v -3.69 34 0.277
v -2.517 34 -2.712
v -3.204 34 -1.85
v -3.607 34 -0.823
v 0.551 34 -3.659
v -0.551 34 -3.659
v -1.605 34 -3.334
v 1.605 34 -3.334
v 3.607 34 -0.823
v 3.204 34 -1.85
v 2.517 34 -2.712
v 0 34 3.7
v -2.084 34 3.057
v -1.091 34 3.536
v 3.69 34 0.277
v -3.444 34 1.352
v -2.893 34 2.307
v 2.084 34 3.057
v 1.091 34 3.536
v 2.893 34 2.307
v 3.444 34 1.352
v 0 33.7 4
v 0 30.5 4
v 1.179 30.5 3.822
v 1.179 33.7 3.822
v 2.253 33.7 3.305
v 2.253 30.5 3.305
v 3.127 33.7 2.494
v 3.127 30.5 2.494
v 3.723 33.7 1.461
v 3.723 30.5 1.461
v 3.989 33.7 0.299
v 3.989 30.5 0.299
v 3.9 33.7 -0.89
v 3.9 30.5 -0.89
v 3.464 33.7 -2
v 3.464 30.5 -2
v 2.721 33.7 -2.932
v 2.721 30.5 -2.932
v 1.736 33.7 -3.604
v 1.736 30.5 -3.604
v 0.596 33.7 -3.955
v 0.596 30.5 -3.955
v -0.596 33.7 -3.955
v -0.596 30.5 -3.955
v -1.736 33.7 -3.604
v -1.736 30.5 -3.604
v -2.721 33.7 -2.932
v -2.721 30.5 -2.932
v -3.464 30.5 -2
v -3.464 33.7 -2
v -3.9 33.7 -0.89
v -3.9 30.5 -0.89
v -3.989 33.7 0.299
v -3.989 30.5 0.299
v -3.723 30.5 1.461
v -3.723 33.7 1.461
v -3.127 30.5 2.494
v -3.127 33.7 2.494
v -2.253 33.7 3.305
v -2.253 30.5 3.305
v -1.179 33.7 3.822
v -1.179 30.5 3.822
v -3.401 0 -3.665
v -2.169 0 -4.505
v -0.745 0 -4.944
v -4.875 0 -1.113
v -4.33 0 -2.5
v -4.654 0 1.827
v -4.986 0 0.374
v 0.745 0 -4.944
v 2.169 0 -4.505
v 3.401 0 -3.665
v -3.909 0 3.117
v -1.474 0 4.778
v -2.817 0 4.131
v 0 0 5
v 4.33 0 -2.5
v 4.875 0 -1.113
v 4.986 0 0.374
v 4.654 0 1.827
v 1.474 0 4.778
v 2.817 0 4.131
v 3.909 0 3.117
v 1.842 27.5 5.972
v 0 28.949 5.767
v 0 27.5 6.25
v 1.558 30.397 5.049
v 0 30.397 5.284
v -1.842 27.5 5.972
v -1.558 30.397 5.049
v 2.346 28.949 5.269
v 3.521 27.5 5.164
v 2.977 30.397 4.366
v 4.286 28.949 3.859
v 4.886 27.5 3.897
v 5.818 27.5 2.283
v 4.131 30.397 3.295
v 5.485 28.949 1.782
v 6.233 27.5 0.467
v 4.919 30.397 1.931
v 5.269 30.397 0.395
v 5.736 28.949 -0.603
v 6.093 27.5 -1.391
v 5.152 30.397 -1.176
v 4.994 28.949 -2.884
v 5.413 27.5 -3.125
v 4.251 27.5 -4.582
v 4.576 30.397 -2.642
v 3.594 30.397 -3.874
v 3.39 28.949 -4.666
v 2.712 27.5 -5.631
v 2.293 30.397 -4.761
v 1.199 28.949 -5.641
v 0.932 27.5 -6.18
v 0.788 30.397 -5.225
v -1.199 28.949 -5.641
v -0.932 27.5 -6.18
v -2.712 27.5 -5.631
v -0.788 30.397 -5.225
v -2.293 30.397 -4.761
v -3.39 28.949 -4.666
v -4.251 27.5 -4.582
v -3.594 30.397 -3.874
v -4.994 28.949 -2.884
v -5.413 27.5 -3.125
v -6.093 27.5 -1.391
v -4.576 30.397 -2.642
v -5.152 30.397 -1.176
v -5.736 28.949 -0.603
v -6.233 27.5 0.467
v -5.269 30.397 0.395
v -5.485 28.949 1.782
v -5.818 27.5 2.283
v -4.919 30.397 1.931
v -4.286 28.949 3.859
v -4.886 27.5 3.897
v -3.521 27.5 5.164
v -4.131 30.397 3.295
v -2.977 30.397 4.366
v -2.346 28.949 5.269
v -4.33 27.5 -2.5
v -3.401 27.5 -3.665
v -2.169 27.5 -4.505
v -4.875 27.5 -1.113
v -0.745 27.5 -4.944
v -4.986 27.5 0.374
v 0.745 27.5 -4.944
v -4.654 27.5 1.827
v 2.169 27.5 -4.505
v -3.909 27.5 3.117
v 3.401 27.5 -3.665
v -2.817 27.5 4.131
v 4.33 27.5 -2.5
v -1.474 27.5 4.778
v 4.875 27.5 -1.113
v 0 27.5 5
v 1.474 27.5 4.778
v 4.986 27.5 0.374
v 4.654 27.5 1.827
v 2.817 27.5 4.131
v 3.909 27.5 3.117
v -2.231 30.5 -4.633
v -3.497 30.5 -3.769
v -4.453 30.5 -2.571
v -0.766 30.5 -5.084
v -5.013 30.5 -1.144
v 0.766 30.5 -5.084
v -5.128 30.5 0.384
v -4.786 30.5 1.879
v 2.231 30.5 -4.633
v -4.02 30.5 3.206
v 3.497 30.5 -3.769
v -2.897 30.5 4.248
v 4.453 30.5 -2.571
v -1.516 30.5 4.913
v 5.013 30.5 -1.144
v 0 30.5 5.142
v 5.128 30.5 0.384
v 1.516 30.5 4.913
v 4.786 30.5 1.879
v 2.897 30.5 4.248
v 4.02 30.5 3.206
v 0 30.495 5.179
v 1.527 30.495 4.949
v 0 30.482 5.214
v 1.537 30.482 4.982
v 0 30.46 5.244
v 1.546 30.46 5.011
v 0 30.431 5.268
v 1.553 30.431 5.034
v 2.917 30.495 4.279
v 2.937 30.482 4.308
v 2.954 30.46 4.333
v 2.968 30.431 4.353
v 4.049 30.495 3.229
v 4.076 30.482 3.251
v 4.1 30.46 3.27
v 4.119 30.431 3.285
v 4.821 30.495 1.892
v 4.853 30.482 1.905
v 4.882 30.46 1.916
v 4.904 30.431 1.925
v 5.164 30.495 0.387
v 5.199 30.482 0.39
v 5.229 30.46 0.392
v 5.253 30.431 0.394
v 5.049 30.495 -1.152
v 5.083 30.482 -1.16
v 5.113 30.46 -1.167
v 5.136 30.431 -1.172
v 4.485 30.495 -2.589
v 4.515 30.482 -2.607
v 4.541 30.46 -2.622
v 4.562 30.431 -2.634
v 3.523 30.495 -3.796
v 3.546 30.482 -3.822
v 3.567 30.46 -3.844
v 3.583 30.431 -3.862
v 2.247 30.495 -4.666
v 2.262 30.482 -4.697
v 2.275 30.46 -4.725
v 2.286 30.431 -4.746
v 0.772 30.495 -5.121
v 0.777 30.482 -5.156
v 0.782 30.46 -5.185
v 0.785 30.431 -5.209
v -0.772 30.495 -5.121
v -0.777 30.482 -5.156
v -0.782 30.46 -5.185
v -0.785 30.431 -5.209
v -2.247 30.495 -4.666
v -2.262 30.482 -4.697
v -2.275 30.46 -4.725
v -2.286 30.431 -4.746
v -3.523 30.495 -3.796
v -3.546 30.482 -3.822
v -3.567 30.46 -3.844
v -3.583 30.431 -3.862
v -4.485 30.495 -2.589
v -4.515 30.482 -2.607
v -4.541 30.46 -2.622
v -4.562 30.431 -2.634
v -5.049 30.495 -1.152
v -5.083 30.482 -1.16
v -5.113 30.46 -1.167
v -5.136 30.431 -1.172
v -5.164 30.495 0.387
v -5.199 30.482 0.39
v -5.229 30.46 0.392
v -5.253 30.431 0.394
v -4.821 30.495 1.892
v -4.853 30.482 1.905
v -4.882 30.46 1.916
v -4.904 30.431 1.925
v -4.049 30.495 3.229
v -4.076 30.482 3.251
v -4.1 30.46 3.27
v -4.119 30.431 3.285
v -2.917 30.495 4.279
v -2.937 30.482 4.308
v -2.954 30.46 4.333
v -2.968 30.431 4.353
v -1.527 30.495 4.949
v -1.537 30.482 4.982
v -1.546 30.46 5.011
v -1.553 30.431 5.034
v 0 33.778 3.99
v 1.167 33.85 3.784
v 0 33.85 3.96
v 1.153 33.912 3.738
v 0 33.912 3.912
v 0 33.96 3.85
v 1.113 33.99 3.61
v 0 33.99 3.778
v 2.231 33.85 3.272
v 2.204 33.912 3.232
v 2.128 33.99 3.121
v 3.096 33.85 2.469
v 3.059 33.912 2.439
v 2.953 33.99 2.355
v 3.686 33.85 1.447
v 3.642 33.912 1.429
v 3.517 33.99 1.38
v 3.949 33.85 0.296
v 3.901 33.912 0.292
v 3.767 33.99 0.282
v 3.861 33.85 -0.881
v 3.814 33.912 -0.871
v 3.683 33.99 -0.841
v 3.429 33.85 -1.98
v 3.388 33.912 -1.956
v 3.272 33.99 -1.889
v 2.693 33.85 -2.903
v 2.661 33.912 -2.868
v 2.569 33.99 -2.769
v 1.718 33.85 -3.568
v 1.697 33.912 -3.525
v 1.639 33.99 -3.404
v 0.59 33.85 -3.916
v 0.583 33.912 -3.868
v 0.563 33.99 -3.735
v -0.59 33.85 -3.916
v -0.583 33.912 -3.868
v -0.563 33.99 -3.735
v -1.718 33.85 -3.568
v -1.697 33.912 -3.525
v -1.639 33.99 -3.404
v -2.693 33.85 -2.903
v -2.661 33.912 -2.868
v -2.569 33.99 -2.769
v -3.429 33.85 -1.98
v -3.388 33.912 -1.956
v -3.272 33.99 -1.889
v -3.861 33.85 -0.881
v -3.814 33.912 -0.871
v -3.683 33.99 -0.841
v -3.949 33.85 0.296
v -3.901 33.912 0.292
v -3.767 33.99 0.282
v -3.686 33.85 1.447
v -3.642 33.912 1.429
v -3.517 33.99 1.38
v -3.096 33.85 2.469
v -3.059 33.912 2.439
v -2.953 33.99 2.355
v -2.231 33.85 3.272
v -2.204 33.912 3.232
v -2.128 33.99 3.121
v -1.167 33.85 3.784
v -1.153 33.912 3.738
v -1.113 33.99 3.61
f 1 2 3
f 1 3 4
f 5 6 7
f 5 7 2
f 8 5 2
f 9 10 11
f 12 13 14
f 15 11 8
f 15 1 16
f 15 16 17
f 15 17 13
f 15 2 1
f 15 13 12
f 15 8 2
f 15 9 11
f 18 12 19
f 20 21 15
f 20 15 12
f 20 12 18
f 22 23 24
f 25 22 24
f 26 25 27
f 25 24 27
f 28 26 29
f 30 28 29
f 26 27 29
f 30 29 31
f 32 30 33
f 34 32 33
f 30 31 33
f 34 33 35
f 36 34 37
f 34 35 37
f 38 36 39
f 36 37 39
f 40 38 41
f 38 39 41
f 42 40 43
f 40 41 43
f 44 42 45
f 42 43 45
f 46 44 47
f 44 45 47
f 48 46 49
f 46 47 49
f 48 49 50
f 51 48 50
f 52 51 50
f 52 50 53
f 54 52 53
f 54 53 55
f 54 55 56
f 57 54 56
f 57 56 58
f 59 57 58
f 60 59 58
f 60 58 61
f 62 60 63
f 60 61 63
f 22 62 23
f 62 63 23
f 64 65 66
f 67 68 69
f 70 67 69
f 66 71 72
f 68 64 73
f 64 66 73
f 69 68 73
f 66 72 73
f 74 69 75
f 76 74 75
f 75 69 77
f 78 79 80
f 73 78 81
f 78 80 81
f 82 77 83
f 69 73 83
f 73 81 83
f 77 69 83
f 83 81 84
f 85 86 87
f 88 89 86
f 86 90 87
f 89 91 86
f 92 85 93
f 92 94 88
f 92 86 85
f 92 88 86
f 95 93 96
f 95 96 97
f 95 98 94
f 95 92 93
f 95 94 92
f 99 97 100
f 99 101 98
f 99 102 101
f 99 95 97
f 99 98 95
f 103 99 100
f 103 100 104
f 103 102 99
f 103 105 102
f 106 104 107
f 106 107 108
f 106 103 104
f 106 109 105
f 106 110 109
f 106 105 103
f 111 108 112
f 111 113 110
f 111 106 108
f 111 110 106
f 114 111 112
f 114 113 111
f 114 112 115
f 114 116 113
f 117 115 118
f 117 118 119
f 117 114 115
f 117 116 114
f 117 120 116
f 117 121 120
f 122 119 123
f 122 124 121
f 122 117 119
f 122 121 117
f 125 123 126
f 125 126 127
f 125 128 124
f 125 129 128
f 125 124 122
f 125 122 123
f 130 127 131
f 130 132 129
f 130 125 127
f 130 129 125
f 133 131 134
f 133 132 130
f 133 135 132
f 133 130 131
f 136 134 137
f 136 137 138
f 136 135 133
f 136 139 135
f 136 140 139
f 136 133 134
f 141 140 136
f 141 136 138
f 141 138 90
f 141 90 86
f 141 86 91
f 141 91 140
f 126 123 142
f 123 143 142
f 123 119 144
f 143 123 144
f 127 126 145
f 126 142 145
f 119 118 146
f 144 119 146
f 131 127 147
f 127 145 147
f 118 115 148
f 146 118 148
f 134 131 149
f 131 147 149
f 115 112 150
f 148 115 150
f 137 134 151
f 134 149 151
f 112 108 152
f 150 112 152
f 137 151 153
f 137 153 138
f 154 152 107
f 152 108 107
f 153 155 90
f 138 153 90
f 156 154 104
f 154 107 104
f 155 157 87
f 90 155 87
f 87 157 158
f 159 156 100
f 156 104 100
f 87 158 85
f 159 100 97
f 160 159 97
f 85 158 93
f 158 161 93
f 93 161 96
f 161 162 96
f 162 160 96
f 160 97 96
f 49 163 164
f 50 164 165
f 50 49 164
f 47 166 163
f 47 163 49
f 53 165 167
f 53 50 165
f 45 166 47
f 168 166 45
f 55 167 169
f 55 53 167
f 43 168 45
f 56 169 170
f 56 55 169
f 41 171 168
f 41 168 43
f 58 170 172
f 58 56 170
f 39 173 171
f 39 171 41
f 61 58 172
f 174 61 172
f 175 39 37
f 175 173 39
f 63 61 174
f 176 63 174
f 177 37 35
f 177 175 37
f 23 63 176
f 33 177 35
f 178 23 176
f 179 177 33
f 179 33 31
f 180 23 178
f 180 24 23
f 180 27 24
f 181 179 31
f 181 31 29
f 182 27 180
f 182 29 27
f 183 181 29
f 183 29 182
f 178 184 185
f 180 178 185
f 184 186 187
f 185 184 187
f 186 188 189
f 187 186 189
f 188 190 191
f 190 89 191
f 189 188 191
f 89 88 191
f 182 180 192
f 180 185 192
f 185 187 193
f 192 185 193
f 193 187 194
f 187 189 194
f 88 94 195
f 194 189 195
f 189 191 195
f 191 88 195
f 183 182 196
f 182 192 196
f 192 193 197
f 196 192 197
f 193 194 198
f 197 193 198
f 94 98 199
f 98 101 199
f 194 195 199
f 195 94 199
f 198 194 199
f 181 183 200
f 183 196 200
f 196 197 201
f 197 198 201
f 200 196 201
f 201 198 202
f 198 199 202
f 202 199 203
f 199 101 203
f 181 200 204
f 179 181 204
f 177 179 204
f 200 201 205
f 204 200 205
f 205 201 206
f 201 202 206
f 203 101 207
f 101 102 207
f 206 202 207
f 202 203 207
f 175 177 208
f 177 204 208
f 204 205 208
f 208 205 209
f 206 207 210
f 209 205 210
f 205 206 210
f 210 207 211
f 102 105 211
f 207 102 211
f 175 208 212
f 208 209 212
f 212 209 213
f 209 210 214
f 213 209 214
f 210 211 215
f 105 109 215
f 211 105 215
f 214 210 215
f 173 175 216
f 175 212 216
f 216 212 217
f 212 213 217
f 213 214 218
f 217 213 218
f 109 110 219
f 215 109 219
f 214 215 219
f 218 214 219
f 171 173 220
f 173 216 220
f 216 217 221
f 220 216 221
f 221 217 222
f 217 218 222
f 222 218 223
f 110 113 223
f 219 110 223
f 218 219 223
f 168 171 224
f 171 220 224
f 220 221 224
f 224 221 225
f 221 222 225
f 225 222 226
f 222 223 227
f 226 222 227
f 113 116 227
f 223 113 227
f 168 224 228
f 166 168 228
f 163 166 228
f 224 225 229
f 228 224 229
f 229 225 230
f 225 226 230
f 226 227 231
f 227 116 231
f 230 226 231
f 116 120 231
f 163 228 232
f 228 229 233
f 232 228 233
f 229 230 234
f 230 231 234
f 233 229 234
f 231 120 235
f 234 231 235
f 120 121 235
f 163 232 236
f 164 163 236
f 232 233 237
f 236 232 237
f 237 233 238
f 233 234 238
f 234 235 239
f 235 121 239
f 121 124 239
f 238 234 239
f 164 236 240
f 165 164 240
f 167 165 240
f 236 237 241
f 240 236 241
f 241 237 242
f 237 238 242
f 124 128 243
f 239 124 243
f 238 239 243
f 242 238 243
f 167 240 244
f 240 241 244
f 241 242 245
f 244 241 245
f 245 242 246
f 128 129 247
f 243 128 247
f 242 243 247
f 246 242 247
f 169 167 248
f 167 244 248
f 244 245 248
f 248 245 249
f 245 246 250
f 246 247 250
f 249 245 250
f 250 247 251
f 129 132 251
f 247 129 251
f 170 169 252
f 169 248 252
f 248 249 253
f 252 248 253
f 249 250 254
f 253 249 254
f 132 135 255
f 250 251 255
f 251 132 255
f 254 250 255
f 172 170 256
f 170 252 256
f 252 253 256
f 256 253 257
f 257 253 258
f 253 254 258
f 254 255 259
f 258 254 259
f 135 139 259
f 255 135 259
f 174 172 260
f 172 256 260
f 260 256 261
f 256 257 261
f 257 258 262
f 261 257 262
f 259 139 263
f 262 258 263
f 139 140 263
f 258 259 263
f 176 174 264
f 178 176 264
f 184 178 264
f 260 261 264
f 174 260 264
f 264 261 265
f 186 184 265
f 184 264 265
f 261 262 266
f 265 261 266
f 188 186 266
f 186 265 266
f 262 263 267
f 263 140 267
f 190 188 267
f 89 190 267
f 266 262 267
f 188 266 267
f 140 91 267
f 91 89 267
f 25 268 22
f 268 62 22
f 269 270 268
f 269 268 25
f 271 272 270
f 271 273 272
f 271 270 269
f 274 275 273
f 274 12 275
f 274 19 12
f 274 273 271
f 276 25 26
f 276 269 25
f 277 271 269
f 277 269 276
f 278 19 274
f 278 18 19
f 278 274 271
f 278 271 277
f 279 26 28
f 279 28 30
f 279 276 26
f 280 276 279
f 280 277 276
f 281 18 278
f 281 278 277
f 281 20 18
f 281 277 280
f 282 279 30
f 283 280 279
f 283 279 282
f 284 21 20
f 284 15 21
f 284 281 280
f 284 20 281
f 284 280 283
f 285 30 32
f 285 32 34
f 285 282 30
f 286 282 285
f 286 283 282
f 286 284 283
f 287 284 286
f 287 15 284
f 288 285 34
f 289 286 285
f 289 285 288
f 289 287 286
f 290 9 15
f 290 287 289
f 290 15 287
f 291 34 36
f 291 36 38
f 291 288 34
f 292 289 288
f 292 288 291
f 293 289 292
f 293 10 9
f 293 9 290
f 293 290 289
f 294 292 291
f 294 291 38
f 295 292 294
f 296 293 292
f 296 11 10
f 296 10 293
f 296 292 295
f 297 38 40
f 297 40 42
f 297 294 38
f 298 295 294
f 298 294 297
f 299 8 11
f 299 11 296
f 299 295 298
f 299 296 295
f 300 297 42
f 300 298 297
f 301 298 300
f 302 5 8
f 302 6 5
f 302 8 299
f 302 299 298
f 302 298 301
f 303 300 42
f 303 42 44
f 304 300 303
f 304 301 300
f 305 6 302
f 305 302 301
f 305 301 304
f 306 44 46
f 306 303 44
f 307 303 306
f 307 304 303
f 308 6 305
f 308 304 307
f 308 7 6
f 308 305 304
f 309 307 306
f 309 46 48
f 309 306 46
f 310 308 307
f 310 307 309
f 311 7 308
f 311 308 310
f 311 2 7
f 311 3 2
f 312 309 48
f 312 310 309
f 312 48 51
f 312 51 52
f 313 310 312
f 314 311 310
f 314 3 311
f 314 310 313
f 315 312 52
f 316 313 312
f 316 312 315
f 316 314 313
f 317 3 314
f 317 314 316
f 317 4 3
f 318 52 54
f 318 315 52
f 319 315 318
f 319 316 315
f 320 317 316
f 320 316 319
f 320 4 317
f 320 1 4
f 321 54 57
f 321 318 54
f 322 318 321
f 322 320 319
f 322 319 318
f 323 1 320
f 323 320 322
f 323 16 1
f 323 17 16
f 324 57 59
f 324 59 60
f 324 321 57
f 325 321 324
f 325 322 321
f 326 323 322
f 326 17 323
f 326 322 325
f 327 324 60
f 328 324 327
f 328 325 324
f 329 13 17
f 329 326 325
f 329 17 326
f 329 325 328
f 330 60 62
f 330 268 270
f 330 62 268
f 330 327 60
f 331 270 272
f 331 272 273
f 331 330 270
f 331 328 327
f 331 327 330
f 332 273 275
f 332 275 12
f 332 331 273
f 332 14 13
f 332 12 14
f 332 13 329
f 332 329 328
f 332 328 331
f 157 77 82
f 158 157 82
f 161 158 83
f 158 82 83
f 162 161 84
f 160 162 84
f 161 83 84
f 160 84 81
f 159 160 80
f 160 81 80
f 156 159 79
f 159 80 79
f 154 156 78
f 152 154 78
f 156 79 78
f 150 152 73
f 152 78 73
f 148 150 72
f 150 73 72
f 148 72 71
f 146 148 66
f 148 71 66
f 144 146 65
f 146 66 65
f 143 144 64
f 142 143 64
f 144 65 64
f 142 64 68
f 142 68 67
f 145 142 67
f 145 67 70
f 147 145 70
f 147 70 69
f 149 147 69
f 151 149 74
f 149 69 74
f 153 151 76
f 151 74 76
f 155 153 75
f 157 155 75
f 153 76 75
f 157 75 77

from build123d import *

# Parameters (mm, degrees)
SKETCH1_R           = 5
BOSS_EXTRUDE1_DEPTH = 27.5
SKETCH2_R           = 6.25
BOSS_EXTRUDE2_DEPTH = 3
SKETCH3_R           = 4
BOSS_EXTRUDE3_DEPTH = 3.5
CHAMFER1_SIZE       = 3
CHAMFER1_SIZE_2     = 1
FILLET1_R           = 0.3
FILLET2_R           = 0.15


with BuildPart() as part:
    # Sketch1 → Boss-Extrude1 (new body)
    with BuildSketch(Plane(origin=(0, 0, 0), x_dir=(1, 0, 0), z_dir=(0, 1, 0))):
        with Locations(Location((0, 0, 0), (0, 0, 270))):
            Circle(SKETCH1_R)
    extrude(amount=BOSS_EXTRUDE1_DEPTH)

    # Sketch2 → Boss-Extrude2 (add)
    with BuildSketch(Plane(origin=(0, 27.5, 0), x_dir=(1, 0, 0), z_dir=(0, 1, 0))):
        with Locations(Location((0, 0, 0), (0, 0, 270))):
            Circle(SKETCH2_R)
    extrude(amount=BOSS_EXTRUDE2_DEPTH)

    # Sketch3 → Boss-Extrude3 (add)
    with BuildSketch(Plane(origin=(0, 30.5, 0), x_dir=(1, 0, 0), z_dir=(0, 1, 0))):
        with Locations(Location((0, 0, 0), (0, 0, 270))):
            Circle(SKETCH3_R)
    extrude(amount=BOSS_EXTRUDE3_DEPTH)

    # Chamfer1
    # the kernel refuses this chamfer: 3, 1 mm, written as the material it takes off along each edge
    with BuildSketch(Plane(origin=(0, 30.5, 0), x_dir=(0, 0, 1), z_dir=(-1, 0, 0))) as chamfer1_piece_1:
        Polygon((6.25, -CHAMFER1_SIZE), (6.25 - CHAMFER1_SIZE_2, 0), (6.25, 0), align=None)
    revolve(axis=Axis((0, 30.5, 0), (0, 1, 0)), mode=Mode.SUBTRACT)

    # Fillet1
    fillet1_edges = [part.edges().sort_by_distance(p)[0] for p in [
        (0, 34, -4),
    ]]
    fillet(fillet1_edges, radius=FILLET1_R)

    # Fillet2
    fillet2_edges = [part.edges().sort_by_distance(p)[0] for p in [
        (0, 30.5, -5.25),
    ]]
    fillet(fillet2_edges, radius=FILLET2_R)


solid = part.part
